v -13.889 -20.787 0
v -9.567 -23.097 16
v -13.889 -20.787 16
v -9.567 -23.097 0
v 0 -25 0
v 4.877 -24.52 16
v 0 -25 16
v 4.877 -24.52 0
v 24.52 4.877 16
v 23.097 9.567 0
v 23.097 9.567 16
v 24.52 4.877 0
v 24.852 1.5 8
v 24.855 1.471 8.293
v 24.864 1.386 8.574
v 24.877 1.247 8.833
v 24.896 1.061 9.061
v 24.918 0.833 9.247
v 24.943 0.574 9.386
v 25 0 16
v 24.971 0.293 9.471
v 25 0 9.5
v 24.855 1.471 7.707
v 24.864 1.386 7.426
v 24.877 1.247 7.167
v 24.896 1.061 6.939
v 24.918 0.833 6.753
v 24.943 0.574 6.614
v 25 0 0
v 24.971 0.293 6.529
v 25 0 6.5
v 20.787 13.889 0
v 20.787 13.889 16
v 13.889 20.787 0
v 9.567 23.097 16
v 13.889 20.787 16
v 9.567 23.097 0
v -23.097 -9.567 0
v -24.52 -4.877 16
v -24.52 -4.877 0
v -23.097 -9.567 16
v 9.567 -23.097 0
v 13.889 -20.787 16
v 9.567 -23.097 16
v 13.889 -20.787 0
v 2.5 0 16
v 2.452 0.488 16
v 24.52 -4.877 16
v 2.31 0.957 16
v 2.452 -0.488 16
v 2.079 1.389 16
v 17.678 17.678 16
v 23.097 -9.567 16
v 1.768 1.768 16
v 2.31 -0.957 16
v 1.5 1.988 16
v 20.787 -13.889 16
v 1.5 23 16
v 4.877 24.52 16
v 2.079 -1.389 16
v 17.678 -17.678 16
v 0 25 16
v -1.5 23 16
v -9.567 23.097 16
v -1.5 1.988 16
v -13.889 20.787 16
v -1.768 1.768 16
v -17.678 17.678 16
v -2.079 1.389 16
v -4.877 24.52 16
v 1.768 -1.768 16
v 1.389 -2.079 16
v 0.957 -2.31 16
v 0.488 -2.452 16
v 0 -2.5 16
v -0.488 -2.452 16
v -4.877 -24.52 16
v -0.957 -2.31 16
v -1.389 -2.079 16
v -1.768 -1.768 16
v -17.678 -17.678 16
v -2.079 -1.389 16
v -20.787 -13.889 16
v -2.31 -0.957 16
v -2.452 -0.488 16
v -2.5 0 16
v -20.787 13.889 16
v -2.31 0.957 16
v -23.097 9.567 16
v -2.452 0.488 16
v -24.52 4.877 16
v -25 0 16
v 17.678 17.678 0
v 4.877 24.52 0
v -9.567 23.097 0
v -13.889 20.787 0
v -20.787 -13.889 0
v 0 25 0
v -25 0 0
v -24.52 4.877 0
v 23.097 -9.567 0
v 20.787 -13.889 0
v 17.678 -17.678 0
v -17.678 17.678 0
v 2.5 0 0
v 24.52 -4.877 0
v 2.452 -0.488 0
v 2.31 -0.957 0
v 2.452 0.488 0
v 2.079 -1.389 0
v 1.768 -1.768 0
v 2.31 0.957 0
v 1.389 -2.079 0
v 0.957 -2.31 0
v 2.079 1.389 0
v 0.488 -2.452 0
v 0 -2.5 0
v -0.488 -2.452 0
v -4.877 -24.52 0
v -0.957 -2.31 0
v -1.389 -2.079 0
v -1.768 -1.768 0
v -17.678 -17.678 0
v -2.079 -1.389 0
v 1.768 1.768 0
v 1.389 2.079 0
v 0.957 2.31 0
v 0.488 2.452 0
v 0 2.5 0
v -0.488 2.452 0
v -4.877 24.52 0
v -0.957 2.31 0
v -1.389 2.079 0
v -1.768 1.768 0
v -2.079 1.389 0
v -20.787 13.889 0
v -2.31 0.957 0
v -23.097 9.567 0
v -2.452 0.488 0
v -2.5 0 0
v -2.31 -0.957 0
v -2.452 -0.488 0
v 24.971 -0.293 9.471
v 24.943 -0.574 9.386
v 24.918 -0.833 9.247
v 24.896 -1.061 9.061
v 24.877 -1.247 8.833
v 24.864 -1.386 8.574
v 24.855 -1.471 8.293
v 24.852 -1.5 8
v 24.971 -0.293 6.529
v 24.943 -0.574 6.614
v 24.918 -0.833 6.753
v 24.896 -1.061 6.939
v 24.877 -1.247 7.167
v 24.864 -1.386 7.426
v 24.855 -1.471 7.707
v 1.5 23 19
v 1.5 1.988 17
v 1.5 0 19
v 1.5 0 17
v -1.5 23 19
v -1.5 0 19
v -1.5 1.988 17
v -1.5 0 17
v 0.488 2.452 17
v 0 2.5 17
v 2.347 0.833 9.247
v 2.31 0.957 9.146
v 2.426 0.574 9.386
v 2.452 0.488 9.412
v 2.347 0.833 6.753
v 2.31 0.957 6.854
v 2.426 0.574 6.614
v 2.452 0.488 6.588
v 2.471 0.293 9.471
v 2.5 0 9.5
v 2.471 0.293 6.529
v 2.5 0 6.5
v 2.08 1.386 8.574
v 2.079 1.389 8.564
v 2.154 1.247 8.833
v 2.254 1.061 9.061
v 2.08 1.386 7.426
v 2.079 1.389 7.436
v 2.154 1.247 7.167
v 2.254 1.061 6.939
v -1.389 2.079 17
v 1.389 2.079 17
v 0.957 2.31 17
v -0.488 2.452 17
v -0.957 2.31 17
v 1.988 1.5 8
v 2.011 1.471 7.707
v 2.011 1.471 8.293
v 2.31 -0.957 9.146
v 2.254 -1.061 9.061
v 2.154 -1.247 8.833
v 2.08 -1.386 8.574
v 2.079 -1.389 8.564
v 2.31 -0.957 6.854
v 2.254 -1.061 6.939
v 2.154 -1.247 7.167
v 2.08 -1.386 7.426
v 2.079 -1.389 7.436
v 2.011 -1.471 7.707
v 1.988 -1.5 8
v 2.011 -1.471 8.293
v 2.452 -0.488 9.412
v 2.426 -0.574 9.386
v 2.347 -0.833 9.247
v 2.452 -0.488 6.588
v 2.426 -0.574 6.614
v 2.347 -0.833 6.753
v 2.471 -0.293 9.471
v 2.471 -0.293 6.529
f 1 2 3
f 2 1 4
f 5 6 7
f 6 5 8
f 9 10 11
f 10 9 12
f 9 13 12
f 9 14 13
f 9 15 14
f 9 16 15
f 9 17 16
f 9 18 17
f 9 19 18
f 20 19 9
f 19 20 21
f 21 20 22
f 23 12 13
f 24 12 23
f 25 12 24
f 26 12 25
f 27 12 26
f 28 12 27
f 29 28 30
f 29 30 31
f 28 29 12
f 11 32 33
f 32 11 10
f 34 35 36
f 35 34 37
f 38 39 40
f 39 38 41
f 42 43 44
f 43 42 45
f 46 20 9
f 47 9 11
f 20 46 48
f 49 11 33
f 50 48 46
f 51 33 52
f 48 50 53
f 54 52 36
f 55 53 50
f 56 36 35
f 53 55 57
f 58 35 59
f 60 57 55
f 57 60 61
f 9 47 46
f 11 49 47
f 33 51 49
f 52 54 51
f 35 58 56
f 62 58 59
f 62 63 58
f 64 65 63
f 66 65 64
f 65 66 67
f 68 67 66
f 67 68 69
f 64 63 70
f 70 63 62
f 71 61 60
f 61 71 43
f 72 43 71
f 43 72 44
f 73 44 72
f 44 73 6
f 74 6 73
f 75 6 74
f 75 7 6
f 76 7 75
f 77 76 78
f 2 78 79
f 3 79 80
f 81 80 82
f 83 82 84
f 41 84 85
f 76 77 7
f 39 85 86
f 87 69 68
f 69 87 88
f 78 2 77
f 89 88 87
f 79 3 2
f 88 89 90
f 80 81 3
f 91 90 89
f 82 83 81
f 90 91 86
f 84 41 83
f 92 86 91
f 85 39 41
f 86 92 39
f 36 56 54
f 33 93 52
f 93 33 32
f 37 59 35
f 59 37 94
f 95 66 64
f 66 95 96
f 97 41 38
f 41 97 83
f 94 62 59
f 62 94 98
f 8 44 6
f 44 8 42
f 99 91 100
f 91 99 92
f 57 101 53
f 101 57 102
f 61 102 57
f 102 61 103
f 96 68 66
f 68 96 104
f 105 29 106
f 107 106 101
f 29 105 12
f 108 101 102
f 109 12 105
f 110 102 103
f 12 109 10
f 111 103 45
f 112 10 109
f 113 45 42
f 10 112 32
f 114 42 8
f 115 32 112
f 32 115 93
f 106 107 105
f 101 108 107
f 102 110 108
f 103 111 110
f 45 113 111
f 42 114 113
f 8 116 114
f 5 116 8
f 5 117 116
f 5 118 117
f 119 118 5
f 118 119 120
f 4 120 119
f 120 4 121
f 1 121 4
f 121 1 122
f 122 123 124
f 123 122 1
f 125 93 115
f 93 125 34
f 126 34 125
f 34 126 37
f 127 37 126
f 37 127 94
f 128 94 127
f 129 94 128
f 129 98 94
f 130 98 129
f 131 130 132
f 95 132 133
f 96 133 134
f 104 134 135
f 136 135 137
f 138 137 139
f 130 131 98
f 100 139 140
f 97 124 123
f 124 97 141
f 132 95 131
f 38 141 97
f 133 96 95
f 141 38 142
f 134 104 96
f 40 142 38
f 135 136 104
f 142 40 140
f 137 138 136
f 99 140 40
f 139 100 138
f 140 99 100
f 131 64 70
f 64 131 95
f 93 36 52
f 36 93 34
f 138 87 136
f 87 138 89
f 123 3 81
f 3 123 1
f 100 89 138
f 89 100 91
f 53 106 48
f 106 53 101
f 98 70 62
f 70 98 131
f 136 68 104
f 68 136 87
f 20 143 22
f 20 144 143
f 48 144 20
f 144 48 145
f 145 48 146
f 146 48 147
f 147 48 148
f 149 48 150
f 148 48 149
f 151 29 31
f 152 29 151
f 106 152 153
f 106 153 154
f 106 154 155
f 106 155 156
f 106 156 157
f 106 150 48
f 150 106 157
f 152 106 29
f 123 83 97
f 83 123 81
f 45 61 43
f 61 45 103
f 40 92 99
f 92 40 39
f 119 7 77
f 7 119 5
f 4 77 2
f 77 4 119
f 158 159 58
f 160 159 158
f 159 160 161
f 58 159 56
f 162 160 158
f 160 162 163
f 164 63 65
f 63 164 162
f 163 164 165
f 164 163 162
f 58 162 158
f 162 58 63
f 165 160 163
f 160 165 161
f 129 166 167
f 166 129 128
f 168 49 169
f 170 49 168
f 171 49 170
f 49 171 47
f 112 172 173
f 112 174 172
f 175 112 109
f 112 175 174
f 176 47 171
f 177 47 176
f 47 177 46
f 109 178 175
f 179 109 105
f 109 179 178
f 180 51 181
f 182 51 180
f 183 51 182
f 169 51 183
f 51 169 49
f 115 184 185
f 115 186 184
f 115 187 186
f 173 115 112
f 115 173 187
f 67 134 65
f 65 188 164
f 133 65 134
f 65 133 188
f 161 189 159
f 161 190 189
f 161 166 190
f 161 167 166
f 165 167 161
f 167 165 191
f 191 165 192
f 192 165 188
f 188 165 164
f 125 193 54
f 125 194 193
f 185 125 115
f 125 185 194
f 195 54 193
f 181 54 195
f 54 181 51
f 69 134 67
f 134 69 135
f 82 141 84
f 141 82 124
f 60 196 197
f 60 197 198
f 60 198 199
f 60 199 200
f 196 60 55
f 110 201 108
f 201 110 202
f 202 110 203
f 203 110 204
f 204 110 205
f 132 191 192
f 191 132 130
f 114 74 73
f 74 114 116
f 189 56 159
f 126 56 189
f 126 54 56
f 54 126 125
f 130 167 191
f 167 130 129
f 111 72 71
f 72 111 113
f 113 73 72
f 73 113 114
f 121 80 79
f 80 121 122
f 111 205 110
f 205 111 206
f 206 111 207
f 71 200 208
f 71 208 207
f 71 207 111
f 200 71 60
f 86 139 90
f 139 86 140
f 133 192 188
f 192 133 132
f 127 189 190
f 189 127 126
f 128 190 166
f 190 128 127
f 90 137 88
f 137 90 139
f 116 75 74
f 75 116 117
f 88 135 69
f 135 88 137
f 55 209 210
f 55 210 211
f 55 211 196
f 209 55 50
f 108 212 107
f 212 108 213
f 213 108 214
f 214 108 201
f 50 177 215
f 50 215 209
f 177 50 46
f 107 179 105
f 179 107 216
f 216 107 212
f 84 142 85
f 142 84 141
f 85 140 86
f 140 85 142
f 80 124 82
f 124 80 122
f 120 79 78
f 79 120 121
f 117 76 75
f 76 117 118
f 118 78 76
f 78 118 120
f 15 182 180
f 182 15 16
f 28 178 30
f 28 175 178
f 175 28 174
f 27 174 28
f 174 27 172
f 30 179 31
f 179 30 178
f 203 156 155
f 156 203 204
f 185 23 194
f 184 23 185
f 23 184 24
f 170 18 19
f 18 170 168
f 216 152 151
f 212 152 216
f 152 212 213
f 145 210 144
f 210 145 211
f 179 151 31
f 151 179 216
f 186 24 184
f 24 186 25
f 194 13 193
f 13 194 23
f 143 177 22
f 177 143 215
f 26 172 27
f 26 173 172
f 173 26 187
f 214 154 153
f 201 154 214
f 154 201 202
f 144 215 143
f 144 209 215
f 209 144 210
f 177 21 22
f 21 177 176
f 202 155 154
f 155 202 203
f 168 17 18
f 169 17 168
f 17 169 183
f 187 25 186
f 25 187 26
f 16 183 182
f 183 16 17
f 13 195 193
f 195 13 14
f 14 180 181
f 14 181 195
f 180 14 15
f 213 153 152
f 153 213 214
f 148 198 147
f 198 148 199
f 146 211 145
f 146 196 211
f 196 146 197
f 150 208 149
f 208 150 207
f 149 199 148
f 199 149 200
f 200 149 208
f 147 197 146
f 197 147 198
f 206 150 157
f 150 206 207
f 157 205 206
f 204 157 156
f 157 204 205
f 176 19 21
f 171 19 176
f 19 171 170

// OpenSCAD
$fn = 32;

// ----------------------------------------------------------------------
// Control knob: pointer knob
// ----------------------------------------------------------------------

// --- parameters (mm) ---
rib_w = 3;                // pointer rib width
rib_h = 4;                // pointer rib height
knob_d = 50;              // knob body diameter
knob_h = 16;              // knob body height
bore_d = 5;               // shaft bore diameter
set_d = 3;                // set screw bore diameter

rib_poke = rib_h - 1;  // rib height above the top
total_h = knob_h + rib_h - 1;  // overall height

difference() {
  union() {
    cylinder(h = knob_h, d = knob_d);
    translate([-rib_w / 2, 0, knob_h - 1])
      cube([rib_w, knob_d / 2 - 2, rib_h]);
  }
  translate([0, 0, -1]) cylinder(h = knob_h + 2, d = bore_d);
  translate([-1, 0, knob_h / 2]) rotate([0, 90, 0])
    cylinder(h = knob_d / 2 + bore_d / 2 + 2, d = set_d);}
